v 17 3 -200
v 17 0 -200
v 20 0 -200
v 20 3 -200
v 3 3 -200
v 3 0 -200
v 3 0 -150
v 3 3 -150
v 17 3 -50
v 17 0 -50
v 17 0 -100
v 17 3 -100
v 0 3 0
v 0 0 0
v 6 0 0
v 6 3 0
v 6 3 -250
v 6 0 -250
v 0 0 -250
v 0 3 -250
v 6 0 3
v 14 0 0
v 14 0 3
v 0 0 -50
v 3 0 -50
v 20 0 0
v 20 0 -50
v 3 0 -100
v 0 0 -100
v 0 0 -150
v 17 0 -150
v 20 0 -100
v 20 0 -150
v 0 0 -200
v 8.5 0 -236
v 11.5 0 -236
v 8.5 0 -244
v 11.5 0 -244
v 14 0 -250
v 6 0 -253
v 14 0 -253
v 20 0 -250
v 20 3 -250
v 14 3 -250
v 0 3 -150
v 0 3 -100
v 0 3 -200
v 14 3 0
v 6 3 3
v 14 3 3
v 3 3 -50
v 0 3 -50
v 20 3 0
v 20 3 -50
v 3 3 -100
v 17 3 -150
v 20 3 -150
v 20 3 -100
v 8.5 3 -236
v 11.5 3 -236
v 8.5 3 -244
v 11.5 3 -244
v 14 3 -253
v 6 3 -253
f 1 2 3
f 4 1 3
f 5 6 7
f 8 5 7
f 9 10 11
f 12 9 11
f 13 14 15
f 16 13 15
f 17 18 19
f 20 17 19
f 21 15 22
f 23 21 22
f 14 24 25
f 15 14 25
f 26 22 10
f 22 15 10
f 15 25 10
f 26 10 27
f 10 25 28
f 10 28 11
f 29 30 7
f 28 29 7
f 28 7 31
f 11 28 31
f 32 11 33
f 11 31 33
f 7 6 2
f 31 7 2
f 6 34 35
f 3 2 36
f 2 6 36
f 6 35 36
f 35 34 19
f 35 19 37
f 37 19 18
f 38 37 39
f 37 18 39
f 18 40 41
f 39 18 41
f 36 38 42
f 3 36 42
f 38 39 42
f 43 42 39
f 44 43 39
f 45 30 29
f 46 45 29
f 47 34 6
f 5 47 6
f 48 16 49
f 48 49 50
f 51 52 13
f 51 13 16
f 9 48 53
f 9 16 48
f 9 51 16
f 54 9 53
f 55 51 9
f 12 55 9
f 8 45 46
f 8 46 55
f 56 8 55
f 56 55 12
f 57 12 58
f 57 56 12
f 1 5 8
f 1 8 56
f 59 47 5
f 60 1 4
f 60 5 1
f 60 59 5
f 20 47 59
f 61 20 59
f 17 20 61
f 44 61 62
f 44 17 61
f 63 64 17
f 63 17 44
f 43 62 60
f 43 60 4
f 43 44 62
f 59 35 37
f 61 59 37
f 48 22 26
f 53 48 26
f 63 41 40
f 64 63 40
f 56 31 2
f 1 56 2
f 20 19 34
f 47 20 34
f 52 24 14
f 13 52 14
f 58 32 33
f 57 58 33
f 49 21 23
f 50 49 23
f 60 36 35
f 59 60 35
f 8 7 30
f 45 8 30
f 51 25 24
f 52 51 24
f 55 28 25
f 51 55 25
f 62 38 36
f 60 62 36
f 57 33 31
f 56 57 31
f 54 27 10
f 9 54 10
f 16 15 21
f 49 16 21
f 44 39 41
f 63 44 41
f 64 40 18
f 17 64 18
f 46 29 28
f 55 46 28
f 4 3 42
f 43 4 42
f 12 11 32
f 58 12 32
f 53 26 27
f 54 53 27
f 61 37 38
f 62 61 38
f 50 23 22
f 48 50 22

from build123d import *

# Parameters (mm, degrees)
SALIENTE_EXTRUIR1_DEPTH = 3


with BuildPart() as part:
    # Croquis1 → Saliente-Extruir1 (new body)
    with BuildSketch(Plane(origin=(0, 0, 0), x_dir=(1, 0, 0), z_dir=(0, 1, 0))):
        Polygon((20, 250), (14, 250), (14, 253), (10, 253), (6, 253), (6, 250), (3, 250), (0, 250), (0, 200), (3, 200), (3, 150), (0, 150), (0, 100), (3, 100), (3, 50), (0, 50), (0, 0), (6, 0), (6, -3), (14, -3), (14, 0), (20, 0), (20, 50), (17, 50), (17, 100), (20, 100), (20, 125), (20, 150), (17, 150), (17, 200), (20, 200), align=None)
        Polygon((8.5, 244), (10, 244), (11.5, 244), (11.5, 236), (8.5, 236), align=None, mode=Mode.SUBTRACT)
    extrude(amount=SALIENTE_EXTRUIR1_DEPTH)


solid = part.part
